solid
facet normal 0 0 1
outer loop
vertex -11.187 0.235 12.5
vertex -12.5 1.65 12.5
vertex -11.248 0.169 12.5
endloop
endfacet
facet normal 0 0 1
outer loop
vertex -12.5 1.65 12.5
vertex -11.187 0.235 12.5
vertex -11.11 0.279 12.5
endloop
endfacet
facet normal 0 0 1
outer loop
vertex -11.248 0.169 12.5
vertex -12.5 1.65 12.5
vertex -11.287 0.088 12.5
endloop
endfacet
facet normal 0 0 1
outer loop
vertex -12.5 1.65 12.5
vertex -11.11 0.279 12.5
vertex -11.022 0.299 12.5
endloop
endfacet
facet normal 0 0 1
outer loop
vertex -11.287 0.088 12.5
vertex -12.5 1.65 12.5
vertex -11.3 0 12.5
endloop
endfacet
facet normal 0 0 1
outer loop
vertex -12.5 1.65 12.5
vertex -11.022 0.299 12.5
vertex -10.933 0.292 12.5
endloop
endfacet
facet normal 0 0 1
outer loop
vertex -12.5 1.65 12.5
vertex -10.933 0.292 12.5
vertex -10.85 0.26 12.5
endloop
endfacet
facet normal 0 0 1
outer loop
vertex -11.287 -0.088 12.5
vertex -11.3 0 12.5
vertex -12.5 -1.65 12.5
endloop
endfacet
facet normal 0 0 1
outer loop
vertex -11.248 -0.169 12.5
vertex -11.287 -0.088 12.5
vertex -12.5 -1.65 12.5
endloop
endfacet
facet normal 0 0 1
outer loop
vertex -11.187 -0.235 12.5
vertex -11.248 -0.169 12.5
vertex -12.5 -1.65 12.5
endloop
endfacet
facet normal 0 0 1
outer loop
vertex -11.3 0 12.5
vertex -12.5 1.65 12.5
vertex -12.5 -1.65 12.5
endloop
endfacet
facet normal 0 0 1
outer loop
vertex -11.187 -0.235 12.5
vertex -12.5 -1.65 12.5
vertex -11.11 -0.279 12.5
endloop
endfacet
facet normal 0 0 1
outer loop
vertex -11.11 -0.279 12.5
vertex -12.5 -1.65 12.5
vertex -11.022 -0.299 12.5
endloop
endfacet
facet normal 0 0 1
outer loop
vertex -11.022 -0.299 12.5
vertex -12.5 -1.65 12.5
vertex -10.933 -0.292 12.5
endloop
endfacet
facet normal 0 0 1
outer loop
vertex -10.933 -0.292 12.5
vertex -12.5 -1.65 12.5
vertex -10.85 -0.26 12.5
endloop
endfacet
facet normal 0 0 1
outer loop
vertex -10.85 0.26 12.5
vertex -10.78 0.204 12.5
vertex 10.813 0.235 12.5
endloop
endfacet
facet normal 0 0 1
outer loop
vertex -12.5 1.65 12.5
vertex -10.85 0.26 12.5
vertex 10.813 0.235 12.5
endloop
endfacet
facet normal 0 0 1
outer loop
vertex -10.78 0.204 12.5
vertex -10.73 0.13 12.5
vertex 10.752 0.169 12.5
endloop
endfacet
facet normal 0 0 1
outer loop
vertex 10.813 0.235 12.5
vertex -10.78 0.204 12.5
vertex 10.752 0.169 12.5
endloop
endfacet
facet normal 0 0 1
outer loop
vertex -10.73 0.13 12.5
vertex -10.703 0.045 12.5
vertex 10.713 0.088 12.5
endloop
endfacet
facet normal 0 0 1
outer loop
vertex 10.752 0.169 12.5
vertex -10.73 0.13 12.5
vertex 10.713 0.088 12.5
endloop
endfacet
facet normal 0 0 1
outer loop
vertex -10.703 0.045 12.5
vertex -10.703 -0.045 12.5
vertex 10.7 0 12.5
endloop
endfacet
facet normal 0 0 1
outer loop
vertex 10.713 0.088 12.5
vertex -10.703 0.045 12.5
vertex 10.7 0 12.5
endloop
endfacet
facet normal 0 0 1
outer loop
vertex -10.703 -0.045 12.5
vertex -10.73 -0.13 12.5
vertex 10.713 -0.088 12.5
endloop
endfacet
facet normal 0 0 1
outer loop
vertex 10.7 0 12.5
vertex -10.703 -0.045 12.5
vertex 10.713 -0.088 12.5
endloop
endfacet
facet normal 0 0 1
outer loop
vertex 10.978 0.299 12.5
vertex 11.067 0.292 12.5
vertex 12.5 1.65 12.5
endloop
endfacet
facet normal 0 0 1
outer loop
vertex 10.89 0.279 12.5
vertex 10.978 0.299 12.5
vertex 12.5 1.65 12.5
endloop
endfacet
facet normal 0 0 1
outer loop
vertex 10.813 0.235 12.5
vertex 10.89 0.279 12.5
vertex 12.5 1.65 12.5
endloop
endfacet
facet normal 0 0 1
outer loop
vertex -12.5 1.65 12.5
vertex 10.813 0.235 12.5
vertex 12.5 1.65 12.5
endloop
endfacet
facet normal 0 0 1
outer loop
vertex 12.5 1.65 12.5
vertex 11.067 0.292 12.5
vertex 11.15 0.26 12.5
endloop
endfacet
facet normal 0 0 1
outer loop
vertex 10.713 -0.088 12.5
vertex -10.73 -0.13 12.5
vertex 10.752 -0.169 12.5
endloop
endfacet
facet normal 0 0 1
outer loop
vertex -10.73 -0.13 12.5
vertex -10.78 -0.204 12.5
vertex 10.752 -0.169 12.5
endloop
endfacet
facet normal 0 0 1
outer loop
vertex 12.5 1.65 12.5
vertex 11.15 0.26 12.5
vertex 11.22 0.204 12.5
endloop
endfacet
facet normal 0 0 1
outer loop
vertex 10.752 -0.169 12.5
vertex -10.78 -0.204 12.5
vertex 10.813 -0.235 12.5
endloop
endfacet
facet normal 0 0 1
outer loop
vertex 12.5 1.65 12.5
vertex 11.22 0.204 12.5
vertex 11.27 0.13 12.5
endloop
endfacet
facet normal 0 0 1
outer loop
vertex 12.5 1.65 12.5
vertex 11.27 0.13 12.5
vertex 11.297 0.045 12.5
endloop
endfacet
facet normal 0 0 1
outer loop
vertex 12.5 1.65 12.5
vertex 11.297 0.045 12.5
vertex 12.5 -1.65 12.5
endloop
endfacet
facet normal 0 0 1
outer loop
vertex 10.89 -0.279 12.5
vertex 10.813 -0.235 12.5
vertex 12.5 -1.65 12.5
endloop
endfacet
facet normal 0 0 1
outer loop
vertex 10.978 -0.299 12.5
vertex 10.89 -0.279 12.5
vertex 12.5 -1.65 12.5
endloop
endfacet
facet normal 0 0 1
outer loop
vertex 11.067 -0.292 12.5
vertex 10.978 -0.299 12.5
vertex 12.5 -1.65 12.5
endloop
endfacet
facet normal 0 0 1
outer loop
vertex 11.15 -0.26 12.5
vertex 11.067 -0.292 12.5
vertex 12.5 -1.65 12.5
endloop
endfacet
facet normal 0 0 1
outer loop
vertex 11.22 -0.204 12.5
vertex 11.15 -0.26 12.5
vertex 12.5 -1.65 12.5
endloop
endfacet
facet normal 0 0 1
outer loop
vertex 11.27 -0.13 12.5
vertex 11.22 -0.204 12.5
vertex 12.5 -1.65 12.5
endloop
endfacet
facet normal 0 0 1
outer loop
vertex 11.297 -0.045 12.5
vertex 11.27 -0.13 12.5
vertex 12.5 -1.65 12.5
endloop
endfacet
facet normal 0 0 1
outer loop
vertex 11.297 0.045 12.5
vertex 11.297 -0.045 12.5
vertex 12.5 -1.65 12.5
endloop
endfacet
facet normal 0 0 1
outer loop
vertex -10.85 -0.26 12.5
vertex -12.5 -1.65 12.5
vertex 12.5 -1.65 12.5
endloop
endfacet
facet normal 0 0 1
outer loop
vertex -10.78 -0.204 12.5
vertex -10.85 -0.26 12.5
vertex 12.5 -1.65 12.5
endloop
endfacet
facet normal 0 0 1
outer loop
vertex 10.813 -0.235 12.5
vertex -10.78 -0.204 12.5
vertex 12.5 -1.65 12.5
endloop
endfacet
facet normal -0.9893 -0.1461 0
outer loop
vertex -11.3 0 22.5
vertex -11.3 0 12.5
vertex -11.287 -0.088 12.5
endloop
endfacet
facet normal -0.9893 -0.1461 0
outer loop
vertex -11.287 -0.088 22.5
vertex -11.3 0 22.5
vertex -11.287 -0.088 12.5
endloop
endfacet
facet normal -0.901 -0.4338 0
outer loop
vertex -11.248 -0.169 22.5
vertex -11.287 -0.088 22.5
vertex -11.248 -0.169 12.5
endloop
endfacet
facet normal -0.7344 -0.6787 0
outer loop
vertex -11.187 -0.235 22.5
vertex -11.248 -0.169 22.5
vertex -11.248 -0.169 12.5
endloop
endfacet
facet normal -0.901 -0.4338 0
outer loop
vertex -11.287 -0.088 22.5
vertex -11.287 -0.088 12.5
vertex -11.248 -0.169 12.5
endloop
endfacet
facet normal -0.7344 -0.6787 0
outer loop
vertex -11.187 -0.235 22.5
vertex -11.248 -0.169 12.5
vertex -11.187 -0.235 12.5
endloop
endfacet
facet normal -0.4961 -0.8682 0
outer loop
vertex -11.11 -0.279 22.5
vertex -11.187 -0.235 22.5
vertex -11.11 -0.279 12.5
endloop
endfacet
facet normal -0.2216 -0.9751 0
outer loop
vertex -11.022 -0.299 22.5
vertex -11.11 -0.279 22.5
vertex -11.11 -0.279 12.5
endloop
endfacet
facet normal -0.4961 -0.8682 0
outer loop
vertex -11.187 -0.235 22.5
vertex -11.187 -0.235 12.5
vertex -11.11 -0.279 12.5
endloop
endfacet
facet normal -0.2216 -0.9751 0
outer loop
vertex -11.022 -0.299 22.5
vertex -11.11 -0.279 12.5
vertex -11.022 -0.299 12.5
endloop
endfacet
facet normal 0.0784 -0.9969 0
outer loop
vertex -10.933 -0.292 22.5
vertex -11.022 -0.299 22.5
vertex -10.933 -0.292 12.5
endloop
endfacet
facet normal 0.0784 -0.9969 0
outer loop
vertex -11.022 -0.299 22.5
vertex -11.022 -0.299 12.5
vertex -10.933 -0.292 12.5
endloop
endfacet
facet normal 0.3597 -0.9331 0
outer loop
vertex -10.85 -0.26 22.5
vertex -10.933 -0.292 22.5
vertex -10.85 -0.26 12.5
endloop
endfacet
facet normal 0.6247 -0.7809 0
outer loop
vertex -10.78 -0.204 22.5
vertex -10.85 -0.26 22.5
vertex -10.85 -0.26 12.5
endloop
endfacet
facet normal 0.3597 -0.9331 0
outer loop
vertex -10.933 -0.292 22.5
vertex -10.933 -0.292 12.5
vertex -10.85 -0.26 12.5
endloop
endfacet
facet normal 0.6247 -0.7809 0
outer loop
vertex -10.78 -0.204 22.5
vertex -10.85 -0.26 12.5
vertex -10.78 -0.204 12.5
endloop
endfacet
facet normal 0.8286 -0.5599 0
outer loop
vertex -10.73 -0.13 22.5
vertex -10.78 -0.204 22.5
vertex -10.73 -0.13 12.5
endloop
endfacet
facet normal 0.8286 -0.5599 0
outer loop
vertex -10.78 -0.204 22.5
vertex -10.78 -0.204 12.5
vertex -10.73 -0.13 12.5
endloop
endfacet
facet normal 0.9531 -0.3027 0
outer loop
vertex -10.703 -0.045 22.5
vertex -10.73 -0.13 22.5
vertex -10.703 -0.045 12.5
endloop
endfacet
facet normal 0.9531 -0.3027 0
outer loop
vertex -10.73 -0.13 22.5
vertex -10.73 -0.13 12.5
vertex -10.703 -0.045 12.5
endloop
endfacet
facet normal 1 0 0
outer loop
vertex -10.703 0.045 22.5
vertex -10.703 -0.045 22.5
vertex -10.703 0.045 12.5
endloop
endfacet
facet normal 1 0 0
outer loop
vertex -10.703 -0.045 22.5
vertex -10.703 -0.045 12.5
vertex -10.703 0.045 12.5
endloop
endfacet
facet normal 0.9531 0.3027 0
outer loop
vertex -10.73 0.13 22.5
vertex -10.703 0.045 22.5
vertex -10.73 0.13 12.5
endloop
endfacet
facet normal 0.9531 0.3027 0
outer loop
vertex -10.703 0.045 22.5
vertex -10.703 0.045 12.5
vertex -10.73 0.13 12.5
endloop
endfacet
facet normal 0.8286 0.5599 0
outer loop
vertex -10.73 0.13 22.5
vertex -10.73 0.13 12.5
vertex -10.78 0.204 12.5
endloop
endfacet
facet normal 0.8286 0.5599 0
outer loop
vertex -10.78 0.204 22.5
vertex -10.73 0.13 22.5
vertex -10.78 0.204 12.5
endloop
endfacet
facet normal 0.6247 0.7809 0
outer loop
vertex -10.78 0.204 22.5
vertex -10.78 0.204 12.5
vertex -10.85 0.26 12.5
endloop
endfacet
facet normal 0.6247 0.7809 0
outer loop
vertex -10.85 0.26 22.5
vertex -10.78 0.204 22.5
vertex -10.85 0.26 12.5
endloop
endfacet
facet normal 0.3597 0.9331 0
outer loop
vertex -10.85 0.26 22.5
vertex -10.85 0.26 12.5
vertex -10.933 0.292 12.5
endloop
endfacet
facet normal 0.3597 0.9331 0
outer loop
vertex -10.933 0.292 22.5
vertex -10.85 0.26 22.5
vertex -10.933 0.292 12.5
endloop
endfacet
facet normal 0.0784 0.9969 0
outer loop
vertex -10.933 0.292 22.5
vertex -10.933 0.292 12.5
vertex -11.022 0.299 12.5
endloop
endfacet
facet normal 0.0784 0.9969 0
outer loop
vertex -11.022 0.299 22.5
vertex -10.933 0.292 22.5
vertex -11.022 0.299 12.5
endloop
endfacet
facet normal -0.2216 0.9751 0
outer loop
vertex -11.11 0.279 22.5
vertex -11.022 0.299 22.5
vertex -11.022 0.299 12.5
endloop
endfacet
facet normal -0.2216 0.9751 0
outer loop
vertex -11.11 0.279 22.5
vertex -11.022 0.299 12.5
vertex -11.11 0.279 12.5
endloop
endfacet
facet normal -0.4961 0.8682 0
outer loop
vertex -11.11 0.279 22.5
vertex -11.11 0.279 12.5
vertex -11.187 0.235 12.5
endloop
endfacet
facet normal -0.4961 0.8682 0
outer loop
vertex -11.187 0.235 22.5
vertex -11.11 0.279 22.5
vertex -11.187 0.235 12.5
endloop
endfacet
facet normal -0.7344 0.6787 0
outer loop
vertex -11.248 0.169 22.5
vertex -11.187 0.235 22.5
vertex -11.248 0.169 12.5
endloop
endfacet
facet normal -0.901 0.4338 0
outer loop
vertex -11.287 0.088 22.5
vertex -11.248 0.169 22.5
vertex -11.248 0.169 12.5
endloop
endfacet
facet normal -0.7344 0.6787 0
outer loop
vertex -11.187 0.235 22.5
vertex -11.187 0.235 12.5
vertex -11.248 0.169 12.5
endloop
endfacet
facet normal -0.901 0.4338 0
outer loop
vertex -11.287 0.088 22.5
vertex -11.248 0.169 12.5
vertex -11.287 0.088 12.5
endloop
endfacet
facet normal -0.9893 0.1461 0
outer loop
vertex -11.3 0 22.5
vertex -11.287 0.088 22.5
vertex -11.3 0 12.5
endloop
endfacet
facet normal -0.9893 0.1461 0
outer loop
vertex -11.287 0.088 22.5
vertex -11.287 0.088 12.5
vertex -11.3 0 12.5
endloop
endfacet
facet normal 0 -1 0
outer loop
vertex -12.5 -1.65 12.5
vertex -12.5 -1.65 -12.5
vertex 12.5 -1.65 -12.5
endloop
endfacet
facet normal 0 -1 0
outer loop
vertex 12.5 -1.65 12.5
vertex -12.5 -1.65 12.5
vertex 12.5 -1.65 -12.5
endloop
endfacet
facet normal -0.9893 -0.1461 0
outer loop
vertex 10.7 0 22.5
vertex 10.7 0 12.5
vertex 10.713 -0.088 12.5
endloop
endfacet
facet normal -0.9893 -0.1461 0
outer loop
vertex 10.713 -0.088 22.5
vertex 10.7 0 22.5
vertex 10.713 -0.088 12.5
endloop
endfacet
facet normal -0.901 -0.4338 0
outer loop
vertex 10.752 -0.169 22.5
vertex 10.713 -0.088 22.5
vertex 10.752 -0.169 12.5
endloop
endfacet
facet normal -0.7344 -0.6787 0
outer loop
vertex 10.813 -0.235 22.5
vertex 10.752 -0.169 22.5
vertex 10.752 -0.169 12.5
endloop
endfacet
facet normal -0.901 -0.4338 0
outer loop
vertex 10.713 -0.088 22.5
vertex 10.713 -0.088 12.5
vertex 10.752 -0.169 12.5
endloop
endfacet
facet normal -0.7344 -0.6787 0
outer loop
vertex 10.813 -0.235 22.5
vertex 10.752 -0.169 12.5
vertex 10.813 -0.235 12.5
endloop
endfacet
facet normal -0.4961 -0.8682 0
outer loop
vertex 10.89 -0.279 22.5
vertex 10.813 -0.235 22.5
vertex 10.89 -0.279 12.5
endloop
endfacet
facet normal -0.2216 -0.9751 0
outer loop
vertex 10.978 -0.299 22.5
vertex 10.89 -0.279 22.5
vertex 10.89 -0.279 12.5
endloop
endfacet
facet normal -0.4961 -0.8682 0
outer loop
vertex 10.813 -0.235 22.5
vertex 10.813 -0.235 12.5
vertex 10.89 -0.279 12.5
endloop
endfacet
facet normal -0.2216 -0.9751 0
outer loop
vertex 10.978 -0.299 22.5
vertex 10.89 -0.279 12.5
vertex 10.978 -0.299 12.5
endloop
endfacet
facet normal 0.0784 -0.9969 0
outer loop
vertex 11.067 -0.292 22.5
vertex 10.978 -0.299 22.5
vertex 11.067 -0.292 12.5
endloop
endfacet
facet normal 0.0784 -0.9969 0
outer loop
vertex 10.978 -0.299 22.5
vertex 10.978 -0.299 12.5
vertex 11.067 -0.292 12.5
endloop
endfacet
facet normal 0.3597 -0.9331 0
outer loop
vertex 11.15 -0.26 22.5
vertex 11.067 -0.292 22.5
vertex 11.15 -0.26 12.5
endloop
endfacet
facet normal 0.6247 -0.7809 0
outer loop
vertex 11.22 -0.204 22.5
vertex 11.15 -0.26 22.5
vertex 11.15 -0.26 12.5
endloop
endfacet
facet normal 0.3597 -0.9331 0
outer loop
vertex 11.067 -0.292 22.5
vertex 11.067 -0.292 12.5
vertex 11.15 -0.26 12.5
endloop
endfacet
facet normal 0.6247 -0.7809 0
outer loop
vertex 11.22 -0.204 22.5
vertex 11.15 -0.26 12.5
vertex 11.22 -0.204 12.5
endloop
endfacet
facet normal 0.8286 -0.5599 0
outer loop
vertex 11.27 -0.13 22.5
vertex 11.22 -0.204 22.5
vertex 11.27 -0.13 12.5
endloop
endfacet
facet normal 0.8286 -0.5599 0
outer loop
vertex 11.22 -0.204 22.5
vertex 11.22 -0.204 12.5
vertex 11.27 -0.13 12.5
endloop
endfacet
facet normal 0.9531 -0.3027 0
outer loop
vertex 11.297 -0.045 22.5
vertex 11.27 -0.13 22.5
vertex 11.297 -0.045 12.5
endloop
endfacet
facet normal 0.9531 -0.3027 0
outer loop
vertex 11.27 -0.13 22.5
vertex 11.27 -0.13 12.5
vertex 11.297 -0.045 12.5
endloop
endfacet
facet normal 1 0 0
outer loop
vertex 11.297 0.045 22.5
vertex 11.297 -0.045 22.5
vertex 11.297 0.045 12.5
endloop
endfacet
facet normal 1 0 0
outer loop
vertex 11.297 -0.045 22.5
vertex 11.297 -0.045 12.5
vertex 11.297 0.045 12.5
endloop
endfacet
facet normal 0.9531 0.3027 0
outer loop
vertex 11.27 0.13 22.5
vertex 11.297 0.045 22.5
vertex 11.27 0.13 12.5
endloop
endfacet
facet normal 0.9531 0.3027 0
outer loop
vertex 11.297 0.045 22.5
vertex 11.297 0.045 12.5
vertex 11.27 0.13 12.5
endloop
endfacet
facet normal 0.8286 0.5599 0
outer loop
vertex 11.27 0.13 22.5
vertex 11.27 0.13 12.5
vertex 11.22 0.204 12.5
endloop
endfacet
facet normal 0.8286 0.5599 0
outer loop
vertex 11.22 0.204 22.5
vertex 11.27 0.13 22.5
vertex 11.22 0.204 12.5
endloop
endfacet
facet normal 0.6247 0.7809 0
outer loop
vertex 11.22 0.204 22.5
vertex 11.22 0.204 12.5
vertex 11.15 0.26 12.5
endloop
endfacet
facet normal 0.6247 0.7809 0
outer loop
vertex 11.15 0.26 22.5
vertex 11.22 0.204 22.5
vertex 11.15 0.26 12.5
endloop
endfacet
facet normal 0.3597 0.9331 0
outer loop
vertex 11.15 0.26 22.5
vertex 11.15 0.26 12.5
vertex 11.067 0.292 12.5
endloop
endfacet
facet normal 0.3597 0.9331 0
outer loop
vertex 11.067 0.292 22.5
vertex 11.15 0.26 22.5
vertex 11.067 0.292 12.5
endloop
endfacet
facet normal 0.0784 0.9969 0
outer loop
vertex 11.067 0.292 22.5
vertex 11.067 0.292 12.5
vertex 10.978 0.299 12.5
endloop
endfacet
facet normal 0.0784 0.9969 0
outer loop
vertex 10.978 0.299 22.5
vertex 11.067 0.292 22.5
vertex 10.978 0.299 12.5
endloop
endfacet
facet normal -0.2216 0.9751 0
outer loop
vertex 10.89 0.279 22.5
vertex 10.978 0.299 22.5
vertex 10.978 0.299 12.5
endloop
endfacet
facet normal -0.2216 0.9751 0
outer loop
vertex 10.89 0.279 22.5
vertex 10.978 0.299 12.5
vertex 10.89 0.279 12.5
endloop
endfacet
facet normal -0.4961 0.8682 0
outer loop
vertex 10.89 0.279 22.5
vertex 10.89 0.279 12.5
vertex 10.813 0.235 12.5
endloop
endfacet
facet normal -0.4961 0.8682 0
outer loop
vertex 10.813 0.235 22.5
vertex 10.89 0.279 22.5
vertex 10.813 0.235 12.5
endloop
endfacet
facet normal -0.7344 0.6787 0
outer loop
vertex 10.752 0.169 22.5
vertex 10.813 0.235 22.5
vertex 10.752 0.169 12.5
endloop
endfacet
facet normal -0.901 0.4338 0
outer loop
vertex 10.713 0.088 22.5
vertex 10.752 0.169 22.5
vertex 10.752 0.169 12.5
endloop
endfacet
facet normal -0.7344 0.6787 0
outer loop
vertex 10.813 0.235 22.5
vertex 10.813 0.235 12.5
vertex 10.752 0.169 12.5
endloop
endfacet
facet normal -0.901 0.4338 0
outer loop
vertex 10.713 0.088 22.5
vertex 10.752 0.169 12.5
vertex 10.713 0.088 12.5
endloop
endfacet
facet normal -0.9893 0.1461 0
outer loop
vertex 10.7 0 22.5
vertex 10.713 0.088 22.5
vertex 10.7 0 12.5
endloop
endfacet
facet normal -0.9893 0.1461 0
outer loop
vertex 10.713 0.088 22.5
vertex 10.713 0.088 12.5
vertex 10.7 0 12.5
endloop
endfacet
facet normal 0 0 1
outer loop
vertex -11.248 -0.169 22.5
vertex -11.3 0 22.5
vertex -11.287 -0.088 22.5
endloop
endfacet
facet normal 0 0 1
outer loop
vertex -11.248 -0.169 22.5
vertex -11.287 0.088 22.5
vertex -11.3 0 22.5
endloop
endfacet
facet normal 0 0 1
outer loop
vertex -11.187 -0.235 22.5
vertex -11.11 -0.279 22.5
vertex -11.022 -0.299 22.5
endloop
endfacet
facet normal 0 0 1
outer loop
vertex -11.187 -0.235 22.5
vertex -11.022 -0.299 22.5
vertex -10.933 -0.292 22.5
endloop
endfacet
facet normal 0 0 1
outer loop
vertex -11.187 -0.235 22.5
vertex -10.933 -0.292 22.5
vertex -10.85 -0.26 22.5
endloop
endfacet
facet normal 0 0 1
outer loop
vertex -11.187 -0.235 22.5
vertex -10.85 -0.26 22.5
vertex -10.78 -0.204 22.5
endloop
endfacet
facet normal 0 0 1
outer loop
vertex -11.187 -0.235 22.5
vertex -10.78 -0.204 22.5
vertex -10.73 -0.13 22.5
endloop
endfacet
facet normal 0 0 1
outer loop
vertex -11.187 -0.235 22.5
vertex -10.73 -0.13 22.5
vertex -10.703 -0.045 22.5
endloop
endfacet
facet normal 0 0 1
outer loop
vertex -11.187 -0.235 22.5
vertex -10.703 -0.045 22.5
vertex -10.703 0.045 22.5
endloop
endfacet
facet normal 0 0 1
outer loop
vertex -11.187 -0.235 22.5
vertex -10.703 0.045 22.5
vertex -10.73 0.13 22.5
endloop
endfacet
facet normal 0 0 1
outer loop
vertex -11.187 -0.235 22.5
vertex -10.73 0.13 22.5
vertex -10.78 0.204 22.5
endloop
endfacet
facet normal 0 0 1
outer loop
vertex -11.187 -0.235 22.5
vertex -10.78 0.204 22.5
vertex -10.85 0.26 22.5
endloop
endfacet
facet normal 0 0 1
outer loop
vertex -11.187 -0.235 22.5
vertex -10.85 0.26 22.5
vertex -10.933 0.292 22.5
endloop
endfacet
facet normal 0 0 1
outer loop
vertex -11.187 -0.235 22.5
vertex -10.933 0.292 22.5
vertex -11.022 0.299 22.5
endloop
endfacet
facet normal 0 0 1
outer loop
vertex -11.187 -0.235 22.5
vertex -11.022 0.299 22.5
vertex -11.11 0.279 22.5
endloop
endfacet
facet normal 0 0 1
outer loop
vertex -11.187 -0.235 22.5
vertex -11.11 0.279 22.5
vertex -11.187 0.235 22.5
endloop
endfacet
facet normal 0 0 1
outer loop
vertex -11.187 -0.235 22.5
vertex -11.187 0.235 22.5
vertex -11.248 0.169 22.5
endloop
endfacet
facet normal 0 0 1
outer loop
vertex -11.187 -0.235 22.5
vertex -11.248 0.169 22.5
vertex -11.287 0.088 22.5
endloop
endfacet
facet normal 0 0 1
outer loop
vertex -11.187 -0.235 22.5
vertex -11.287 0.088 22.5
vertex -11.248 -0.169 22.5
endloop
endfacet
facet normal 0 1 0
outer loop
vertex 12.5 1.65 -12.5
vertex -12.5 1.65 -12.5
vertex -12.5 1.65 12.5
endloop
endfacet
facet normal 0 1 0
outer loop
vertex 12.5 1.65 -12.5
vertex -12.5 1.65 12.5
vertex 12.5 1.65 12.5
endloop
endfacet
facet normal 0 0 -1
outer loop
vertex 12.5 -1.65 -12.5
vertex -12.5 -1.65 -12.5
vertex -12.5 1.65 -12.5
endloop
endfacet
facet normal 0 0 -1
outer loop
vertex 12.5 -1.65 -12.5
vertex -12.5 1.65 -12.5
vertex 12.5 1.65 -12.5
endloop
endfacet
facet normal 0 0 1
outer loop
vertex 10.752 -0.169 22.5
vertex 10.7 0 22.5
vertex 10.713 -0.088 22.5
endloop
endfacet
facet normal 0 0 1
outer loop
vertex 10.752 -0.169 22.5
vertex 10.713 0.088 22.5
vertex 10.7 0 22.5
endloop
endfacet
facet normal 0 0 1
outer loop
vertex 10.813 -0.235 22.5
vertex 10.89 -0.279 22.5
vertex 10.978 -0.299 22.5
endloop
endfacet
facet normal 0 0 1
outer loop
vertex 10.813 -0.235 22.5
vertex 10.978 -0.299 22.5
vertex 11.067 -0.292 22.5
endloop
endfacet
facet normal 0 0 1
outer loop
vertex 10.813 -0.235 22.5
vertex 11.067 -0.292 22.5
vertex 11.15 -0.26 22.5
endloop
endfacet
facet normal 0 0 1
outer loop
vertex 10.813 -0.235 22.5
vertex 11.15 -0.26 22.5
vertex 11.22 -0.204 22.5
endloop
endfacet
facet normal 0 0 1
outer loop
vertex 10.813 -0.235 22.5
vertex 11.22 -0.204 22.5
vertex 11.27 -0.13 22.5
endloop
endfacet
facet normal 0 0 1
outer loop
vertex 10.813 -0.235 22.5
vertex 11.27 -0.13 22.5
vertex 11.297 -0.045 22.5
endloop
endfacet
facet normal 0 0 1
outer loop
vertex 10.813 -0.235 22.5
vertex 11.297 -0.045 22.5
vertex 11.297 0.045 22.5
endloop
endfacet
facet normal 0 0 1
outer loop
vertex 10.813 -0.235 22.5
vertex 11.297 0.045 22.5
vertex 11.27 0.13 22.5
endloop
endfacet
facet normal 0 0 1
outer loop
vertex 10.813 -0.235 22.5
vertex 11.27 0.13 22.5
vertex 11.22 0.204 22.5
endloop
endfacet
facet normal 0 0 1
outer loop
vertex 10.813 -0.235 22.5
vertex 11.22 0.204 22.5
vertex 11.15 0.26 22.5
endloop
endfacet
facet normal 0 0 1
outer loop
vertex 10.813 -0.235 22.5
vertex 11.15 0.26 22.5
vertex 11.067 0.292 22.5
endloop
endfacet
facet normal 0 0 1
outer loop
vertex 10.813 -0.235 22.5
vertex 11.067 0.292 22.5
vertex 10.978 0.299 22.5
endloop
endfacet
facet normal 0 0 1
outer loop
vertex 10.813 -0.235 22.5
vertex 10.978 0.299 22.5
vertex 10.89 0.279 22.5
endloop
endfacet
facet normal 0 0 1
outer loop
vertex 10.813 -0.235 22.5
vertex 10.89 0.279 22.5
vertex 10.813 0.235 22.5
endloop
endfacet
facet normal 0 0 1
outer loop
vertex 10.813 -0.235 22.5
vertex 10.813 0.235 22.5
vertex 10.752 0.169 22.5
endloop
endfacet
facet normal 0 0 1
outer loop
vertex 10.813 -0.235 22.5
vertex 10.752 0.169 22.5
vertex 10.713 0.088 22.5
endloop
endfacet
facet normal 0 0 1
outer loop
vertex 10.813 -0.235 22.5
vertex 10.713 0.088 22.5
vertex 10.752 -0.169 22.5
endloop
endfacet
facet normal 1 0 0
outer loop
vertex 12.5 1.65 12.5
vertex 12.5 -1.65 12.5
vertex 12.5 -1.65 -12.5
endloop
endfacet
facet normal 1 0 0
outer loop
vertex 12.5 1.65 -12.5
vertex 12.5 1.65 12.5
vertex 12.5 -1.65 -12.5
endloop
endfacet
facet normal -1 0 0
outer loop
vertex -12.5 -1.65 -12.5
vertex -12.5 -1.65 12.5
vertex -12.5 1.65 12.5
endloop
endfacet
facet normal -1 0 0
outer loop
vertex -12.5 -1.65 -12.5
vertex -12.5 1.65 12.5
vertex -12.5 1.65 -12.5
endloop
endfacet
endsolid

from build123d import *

# Parameters (mm, degrees)
EXTRUDE_1_DEPTH      = 1.65
EXTRUDE_1_DEPTH_BACK = 1.65
SKETCH_1_W           = 25
SKETCH_1_H           = 25
SKETCH_2_R           = 0.3
EXTRUDE_2_DEPTH      = 10


with BuildPart() as part:
    # 草图1 → 拉伸1 (new, two sides: drawn at the far end of the back side and taken through both)
    with BuildSketch(Plane(origin=(0, 0, 0), x_dir=(1, 0, 0), z_dir=(0, 1, 0)).offset(-EXTRUDE_1_DEPTH_BACK)):
        Rectangle(SKETCH_1_W, SKETCH_1_H)
    extrude(amount=EXTRUDE_1_DEPTH + EXTRUDE_1_DEPTH_BACK)

    # 草图2 → 拉伸2 (add)
    with BuildSketch(Plane.XY.offset(12.5)):
        with Locations((-11, 0)):
            Circle(SKETCH_2_R)
        with Locations((11, 0)):
            Circle(SKETCH_2_R)
    extrude(amount=EXTRUDE_2_DEPTH)


solid = part.part
